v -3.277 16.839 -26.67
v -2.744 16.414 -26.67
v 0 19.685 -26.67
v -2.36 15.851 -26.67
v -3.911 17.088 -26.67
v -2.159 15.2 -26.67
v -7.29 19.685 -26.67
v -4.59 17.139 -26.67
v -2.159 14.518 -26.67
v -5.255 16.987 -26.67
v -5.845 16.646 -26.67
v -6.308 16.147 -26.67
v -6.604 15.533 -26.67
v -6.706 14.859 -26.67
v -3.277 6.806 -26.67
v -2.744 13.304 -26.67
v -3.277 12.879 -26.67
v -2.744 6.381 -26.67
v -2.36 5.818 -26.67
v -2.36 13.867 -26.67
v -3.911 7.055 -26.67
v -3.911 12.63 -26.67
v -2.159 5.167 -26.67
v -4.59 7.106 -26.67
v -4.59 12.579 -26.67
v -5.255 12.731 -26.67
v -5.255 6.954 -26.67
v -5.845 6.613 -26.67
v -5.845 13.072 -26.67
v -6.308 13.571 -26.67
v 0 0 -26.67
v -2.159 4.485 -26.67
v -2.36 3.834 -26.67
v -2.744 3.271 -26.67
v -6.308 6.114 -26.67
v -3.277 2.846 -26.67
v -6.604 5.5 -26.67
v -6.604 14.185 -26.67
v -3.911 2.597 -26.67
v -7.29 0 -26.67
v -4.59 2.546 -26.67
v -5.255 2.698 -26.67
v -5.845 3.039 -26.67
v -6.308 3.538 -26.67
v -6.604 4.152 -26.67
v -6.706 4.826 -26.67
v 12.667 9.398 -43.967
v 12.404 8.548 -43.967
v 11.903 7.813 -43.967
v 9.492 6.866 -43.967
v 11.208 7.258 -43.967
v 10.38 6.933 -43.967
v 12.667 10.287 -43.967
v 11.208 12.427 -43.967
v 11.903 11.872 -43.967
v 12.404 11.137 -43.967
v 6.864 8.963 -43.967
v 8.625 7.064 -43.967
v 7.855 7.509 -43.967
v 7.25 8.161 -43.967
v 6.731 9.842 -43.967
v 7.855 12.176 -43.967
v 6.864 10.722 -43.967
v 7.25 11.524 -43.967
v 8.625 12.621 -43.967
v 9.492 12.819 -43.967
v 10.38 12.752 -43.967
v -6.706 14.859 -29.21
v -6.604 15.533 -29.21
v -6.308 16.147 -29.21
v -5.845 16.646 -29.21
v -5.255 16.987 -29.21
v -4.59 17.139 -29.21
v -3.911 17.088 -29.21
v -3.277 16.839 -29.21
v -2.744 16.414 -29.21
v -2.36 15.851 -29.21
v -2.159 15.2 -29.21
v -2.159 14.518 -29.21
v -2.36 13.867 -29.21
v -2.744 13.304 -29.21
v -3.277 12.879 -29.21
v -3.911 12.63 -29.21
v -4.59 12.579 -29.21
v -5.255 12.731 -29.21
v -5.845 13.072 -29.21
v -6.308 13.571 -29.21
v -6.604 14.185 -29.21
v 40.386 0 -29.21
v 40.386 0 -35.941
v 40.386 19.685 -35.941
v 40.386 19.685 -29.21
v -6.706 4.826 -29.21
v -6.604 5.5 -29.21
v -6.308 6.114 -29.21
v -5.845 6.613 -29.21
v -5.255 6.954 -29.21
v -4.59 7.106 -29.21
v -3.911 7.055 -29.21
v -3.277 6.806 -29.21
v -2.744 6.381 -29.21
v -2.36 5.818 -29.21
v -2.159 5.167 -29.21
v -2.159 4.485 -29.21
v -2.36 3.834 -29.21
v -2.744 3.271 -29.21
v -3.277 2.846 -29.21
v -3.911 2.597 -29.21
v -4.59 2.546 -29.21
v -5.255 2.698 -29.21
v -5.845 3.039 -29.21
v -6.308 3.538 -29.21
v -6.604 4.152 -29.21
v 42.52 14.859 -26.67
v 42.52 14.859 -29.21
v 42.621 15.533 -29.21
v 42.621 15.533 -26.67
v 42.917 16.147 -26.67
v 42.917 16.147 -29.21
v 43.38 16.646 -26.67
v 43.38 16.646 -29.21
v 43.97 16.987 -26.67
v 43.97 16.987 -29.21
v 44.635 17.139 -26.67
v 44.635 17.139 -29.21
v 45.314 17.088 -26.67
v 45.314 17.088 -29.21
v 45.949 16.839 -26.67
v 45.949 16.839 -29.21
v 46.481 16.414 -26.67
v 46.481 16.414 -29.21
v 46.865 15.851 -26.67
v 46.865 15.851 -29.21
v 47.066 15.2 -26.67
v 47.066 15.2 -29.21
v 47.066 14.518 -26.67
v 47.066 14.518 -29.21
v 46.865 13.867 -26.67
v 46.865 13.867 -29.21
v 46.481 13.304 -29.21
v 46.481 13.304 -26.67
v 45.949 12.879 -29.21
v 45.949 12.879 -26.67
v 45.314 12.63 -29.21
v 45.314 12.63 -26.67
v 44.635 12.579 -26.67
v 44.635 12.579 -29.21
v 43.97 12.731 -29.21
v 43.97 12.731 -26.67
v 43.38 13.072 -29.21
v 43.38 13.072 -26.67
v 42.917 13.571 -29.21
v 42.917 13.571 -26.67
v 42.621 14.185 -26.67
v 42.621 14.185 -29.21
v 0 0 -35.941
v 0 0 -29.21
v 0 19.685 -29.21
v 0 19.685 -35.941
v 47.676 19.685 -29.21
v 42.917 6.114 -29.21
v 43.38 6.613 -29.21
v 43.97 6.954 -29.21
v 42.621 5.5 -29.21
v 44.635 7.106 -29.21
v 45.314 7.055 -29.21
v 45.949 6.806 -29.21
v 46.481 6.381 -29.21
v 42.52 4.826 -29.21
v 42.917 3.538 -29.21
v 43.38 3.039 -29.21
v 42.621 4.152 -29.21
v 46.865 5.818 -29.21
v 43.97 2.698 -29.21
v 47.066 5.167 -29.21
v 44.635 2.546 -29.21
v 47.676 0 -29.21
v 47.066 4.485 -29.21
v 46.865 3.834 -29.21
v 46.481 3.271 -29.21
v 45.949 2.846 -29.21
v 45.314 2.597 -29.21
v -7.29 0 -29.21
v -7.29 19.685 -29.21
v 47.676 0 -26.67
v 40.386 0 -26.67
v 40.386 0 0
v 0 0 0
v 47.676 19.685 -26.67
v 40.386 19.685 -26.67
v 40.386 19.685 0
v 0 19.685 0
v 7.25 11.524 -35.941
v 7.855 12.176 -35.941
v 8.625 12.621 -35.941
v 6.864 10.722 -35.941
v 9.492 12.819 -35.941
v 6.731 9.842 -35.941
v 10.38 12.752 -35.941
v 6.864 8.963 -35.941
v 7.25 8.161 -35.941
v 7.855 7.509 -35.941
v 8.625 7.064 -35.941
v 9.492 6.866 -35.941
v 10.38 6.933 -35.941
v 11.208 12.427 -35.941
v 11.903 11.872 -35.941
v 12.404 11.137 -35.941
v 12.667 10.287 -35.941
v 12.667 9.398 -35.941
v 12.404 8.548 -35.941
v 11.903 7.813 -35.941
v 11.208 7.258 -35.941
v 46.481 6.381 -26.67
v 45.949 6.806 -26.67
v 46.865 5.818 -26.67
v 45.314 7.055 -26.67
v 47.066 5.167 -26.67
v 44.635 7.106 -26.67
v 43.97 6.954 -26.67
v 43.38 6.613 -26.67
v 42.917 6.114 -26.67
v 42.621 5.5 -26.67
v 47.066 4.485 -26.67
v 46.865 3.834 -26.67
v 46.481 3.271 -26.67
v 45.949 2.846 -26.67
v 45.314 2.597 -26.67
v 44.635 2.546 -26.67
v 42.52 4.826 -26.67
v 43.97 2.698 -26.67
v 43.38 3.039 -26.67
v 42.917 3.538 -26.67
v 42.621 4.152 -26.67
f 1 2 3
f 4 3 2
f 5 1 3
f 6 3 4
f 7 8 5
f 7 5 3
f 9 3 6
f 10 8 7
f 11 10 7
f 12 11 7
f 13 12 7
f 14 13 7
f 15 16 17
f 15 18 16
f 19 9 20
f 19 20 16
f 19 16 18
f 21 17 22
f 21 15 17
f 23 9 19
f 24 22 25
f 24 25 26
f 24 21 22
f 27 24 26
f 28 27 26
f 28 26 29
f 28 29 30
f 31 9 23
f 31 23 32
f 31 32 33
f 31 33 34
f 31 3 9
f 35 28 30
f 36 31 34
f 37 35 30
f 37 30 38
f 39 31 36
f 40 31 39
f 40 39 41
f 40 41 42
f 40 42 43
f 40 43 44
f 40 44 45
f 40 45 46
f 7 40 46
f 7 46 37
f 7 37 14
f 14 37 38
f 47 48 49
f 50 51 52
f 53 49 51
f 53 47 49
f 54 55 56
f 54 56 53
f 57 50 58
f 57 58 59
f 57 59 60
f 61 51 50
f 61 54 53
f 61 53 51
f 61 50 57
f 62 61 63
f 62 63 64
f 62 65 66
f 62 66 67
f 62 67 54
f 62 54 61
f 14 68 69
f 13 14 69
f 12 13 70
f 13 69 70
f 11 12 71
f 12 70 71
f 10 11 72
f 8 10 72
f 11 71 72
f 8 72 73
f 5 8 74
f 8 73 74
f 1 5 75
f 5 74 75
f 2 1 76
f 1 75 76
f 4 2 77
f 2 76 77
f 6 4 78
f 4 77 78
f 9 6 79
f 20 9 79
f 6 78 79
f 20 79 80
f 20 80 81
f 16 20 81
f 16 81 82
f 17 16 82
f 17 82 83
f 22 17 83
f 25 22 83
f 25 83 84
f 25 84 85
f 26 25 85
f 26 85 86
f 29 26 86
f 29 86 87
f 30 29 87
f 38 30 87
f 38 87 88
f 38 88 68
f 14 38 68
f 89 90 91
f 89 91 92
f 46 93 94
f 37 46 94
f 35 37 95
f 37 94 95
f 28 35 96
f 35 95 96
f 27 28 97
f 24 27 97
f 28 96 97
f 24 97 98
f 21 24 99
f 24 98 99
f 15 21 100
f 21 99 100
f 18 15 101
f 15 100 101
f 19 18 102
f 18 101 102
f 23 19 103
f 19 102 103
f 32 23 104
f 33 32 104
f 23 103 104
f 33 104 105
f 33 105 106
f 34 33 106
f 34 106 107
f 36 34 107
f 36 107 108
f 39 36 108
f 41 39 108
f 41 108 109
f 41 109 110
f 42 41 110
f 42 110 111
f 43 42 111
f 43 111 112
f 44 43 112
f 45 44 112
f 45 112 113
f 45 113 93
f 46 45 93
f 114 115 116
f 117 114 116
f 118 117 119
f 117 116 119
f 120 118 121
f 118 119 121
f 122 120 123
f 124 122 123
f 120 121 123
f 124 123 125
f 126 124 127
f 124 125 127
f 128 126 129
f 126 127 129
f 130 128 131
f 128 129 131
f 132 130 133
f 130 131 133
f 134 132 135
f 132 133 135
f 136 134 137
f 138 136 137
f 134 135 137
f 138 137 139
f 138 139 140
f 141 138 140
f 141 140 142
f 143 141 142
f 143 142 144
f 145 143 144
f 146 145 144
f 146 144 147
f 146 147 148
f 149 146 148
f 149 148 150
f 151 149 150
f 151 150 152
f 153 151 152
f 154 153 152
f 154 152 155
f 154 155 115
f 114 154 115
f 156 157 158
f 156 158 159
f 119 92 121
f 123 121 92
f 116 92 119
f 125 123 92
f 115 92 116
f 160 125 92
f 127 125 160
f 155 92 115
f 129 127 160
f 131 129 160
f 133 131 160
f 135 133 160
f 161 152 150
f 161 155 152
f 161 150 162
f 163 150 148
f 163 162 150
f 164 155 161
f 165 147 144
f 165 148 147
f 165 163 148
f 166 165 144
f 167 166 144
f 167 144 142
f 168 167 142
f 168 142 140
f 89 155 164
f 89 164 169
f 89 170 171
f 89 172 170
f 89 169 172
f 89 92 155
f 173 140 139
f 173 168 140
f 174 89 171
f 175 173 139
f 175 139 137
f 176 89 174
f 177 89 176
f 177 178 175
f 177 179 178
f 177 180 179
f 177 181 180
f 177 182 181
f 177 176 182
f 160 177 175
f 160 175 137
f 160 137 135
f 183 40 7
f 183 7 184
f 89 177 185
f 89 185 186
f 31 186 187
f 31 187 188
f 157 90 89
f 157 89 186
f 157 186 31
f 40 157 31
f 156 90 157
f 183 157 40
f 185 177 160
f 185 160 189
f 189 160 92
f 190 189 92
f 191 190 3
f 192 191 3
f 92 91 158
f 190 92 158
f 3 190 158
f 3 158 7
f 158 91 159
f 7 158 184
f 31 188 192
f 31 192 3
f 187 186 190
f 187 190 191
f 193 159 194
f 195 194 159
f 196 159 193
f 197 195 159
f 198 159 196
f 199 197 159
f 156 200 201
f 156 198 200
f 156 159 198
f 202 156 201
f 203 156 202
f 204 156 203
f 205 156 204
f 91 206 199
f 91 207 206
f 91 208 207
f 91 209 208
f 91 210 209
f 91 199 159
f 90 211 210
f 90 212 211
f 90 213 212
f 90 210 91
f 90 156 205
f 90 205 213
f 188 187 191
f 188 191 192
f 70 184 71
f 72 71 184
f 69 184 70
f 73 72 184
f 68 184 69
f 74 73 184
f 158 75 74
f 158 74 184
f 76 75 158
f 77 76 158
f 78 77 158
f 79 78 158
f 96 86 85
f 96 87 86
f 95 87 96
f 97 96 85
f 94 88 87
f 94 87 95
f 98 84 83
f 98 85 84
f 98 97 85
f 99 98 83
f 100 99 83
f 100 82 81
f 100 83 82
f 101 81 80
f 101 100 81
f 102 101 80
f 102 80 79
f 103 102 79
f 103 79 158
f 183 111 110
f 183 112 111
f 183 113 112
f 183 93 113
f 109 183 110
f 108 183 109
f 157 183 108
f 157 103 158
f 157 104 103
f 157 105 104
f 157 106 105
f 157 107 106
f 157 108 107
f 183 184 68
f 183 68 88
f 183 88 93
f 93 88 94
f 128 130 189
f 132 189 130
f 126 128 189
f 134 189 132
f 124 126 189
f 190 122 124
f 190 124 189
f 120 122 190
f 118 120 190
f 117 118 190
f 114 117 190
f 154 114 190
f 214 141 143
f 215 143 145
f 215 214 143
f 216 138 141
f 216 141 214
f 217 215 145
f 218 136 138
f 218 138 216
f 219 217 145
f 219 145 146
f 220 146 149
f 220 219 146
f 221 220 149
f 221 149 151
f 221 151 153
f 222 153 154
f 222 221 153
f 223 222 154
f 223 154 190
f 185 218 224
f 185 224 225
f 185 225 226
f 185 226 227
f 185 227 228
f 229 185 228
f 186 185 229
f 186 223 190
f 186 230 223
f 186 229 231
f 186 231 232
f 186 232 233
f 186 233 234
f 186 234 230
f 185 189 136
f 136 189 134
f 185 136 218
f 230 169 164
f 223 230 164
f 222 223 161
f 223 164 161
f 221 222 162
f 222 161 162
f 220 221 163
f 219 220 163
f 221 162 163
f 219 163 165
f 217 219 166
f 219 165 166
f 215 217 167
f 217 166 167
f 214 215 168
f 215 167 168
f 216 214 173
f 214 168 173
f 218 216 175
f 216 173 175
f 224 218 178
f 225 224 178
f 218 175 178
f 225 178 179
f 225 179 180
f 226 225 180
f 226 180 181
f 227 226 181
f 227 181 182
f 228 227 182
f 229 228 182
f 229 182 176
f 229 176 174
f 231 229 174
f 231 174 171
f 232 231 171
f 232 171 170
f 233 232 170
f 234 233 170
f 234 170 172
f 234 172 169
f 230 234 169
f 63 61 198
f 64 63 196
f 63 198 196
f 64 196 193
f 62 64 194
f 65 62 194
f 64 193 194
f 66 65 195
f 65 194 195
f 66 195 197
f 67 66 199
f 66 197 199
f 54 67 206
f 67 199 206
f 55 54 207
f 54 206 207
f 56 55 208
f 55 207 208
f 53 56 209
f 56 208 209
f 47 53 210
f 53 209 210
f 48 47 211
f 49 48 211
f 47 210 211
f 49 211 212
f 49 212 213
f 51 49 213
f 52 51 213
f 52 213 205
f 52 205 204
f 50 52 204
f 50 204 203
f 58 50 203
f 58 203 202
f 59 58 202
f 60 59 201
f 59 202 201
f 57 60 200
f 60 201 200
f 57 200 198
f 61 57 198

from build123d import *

# Parameters (mm, degrees)
BOSS_EXTRUDE1_DEPTH = 19.685
SKETCH3_R           = 2.9845
BOSS_EXTRUDE2_DEPTH = 8.0264
CUT_EXTRUDE1_REACH  = 31.21
SKETCH4_R           = 2.286


with BuildPart() as part:
    # Sketch1 → Boss-Extrude1 (new body)
    with BuildSketch(Plane(origin=(0, 0, 0), x_dir=(1, 0, 0), z_dir=(0, 1, 0))):
        Polygon((0, 29.21), (0, 35.941), (40.386, 35.941), (40.386, 29.21), (47.6758, 29.21), (47.6758, 26.67), (40.386, 26.67), (40.386, 0), (0, 0), (0, 26.67), (-7.2898, 26.67), (-7.2898, 29.21), align=None)
    extrude(amount=BOSS_EXTRUDE1_DEPTH)

    # Sketch3 → Boss-Extrude2 (add)
    with BuildSketch(Plane(origin=(0, 0, -35.941), x_dir=(-1, 0, 0), z_dir=(0, 0, -1))):
        with Locations((-9.7155, 9.8425)):
            Circle(SKETCH3_R)
    extrude(amount=BOSS_EXTRUDE2_DEPTH)

    # Sketch4 → Cut-Extrude1 (cut, up to next)
    with BuildSketch(Plane(origin=(0, 0, -29.21), x_dir=(-1, 0, 0), z_dir=(0, 0, -1)), mode=Mode.PRIVATE) as cut_extrude1_sk1:
        with Locations((-44.8056, 14.859)):
            Circle(SKETCH4_R)
    cut_extrude1_tool1 = extrude(cut_extrude1_sk1.sketch, amount=-CUT_EXTRUDE1_REACH, mode=Mode.PRIVATE) & part.part
    add(cut_extrude1_tool1.solids().sort_by_distance((44.8056, 14.859, -29.21))[0], mode=Mode.SUBTRACT)
    # Sketch4 → Cut-Extrude1 (cut, up to next)
    with BuildSketch(Plane(origin=(0, 0, -29.21), x_dir=(-1, 0, 0), z_dir=(0, 0, -1)), mode=Mode.PRIVATE) as cut_extrude1_sk2:
        with Locations((-44.8056, 4.826)):
            Circle(SKETCH4_R)
    cut_extrude1_tool2 = extrude(cut_extrude1_sk2.sketch, amount=-CUT_EXTRUDE1_REACH, mode=Mode.PRIVATE) & part.part
    add(cut_extrude1_tool2.solids().sort_by_distance((44.8056, 4.826, -29.21))[0], mode=Mode.SUBTRACT)
    # Sketch4 → Cut-Extrude1 (cut, up to next)
    with BuildSketch(Plane(origin=(0, 0, -29.21), x_dir=(-1, 0, 0), z_dir=(0, 0, -1)), mode=Mode.PRIVATE) as cut_extrude1_sk3:
        with Locations((4.4196, 14.859)):
            Circle(SKETCH4_R)
    cut_extrude1_tool3 = extrude(cut_extrude1_sk3.sketch, amount=-CUT_EXTRUDE1_REACH, mode=Mode.PRIVATE) & part.part
    add(cut_extrude1_tool3.solids().sort_by_distance((-4.4196, 14.859, -29.21))[0], mode=Mode.SUBTRACT)
    # Sketch4 → Cut-Extrude1 (cut, up to next)
    with BuildSketch(Plane(origin=(0, 0, -29.21), x_dir=(-1, 0, 0), z_dir=(0, 0, -1)), mode=Mode.PRIVATE) as cut_extrude1_sk4:
        with Locations((4.4196, 4.826)):
            Circle(SKETCH4_R)
    cut_extrude1_tool4 = extrude(cut_extrude1_sk4.sketch, amount=-CUT_EXTRUDE1_REACH, mode=Mode.PRIVATE) & part.part
    add(cut_extrude1_tool4.solids().sort_by_distance((-4.4196, 4.826, -29.21))[0], mode=Mode.SUBTRACT)


solid = part.part
